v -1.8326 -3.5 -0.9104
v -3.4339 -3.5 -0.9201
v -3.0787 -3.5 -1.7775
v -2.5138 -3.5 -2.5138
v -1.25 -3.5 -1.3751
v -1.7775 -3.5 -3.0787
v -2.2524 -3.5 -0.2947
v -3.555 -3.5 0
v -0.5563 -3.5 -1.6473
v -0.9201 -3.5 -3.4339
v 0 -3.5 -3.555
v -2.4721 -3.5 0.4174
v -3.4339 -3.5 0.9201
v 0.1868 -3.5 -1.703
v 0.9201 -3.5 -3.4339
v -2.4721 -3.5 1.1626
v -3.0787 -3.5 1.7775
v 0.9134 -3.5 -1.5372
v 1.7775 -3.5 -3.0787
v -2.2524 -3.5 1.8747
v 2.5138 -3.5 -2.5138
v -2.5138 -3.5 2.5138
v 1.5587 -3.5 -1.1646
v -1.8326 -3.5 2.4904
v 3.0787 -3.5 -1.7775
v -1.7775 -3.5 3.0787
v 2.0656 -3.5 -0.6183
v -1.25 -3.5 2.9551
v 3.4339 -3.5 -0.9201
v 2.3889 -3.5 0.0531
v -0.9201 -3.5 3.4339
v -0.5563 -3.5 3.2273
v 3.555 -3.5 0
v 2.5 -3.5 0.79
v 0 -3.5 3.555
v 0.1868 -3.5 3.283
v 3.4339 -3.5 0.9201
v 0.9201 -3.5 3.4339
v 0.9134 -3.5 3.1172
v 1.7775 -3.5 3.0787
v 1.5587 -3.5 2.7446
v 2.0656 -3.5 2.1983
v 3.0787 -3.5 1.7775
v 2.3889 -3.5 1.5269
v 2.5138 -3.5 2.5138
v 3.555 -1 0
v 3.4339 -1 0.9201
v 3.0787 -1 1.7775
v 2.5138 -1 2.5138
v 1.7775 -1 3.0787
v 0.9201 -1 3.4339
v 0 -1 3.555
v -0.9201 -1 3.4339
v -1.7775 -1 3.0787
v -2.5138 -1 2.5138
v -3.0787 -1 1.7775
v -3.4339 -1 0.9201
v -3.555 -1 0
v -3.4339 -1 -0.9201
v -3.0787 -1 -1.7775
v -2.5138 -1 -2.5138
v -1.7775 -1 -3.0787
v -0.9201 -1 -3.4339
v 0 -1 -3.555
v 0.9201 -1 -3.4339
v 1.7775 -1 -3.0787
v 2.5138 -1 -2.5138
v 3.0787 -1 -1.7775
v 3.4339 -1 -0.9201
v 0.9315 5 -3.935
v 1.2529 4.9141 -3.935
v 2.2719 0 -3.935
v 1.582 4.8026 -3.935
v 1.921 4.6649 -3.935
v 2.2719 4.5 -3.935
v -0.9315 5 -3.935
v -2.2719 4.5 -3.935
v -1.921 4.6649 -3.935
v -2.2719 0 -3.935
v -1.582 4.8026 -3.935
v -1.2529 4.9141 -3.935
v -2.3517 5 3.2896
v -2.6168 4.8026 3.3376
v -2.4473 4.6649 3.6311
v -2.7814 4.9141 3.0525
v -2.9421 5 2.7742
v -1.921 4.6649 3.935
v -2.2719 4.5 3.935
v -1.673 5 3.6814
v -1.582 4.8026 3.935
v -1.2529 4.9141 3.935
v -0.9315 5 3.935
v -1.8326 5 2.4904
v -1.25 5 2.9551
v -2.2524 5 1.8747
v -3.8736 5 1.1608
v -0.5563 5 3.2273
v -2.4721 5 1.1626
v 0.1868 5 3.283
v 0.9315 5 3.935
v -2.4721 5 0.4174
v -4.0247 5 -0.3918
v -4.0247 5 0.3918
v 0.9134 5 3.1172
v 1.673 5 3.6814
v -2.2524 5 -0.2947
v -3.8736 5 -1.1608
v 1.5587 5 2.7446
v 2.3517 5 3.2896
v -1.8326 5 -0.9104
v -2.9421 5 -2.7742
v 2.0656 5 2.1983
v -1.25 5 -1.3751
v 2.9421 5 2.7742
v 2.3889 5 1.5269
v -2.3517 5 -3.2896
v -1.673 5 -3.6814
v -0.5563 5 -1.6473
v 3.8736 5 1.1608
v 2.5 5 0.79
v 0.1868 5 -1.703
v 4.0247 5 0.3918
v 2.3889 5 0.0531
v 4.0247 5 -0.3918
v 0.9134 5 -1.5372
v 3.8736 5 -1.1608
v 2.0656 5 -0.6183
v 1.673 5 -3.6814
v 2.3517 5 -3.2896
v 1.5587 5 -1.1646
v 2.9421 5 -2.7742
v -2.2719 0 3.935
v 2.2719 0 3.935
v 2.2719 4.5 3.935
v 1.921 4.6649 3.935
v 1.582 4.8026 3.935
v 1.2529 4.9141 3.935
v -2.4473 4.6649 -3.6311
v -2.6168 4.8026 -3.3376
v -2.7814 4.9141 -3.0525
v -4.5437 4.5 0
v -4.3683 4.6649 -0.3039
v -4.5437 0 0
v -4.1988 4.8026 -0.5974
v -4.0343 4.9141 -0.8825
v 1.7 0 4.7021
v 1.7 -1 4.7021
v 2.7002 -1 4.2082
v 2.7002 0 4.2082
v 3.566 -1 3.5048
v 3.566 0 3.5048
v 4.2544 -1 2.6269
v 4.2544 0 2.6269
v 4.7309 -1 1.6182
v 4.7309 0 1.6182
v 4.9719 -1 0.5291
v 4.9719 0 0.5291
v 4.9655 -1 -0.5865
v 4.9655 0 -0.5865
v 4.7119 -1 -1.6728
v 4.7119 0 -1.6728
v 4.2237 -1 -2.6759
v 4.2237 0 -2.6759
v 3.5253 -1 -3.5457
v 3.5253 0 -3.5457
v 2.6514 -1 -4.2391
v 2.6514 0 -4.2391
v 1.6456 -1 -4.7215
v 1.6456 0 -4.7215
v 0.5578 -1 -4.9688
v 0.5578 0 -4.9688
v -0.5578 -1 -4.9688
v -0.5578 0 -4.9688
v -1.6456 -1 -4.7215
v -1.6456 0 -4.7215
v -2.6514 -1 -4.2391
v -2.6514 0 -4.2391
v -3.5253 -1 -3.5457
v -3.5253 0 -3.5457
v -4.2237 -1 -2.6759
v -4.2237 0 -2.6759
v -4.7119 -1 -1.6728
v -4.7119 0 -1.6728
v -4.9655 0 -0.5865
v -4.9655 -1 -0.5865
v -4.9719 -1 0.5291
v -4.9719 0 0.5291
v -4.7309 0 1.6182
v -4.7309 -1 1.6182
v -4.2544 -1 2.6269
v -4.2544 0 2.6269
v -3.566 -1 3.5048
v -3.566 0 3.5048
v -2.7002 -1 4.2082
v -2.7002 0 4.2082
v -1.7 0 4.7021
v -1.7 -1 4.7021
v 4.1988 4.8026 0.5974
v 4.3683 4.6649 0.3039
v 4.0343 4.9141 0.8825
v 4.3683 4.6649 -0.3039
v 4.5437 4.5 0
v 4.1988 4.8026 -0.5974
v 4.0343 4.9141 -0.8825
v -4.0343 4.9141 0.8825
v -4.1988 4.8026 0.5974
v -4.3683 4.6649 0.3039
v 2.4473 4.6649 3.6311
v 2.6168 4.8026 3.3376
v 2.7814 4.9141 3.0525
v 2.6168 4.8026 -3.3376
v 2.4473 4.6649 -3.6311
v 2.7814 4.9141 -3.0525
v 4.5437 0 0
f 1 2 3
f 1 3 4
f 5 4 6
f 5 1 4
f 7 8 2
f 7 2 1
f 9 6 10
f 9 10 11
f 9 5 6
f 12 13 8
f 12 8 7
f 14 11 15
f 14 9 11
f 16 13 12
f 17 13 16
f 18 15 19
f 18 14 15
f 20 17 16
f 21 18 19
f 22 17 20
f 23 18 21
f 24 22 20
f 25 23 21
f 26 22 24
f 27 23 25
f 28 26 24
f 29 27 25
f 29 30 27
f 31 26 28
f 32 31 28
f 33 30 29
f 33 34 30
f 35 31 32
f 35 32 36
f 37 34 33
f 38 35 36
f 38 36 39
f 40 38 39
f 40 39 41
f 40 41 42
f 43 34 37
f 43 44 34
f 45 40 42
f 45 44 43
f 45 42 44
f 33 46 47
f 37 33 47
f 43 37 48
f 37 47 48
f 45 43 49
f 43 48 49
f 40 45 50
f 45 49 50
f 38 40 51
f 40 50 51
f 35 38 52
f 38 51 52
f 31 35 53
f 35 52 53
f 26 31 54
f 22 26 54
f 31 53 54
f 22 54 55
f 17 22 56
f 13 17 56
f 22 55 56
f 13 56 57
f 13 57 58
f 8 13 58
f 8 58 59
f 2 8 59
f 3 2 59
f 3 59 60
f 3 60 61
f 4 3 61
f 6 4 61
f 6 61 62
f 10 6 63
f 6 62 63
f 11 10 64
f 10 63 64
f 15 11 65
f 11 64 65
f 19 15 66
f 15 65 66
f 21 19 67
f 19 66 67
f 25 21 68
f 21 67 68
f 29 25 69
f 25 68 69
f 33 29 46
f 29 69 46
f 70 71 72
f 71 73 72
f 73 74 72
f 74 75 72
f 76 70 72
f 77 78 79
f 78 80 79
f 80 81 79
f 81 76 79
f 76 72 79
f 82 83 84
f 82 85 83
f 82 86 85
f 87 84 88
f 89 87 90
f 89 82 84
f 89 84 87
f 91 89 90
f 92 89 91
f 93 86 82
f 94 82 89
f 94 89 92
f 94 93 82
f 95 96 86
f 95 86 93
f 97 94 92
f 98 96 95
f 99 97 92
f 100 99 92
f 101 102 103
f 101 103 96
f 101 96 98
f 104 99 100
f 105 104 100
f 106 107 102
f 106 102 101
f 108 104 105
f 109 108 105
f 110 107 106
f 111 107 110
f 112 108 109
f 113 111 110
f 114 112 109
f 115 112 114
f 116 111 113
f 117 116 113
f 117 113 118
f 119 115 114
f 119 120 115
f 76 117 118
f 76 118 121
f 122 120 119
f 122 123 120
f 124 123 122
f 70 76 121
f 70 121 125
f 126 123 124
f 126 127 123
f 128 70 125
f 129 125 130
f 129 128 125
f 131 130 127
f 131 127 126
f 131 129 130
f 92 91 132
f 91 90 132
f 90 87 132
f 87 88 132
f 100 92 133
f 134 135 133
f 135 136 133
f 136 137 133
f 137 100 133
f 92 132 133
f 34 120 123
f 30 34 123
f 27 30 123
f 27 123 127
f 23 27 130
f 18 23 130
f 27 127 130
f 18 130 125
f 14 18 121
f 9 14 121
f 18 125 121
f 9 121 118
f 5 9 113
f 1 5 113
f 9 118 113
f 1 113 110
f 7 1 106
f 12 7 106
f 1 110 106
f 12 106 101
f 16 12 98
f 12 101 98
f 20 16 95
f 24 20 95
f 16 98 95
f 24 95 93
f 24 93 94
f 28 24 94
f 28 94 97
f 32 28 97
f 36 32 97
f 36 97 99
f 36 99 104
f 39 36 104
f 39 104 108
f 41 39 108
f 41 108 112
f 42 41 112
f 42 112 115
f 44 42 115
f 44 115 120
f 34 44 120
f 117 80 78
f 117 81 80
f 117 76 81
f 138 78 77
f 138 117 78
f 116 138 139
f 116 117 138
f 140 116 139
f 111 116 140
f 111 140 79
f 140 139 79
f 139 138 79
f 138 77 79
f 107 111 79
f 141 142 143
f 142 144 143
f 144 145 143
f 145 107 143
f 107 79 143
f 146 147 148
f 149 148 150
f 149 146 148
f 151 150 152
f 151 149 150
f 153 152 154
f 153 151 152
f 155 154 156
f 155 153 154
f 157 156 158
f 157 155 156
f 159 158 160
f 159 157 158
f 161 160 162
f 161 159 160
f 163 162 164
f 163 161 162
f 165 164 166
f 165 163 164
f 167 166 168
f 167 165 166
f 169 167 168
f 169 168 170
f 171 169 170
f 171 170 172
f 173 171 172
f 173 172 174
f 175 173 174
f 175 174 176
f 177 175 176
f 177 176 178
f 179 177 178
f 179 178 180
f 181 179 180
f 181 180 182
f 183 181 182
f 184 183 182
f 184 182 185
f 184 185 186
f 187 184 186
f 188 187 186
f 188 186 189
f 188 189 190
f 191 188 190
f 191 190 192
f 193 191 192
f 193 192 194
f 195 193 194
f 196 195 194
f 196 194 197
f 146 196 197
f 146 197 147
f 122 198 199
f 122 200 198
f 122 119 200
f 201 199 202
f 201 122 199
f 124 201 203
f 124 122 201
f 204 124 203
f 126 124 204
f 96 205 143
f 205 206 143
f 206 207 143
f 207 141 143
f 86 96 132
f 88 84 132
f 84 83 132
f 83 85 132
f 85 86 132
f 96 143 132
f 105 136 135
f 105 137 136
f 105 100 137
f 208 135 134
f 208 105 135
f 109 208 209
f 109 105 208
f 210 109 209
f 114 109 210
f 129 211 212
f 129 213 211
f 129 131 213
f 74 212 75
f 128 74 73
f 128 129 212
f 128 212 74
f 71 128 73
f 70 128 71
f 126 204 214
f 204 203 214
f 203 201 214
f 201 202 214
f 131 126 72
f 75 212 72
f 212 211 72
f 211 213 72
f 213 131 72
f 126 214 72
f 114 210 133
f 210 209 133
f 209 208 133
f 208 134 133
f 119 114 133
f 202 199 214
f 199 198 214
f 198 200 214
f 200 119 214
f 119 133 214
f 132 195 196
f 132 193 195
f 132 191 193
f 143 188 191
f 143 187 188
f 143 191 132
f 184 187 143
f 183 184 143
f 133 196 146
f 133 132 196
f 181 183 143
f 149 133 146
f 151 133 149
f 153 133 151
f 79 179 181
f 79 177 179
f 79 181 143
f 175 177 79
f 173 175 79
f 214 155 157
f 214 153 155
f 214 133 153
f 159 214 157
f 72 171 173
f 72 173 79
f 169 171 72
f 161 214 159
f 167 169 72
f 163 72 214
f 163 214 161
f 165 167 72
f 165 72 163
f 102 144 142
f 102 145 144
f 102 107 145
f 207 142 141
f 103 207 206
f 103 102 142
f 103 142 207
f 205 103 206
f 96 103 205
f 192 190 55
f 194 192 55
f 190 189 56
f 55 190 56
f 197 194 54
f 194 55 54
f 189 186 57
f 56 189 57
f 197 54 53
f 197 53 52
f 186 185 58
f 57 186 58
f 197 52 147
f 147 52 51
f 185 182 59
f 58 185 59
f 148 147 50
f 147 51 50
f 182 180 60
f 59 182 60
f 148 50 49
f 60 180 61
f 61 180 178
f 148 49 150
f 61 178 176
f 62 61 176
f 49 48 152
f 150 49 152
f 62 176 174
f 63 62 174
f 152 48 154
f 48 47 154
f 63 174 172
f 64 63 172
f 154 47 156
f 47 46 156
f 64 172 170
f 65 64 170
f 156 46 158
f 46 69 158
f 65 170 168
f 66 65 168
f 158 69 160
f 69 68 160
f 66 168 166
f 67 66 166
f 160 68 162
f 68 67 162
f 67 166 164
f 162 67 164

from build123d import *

# Parameters (mm, degrees)
BOSS_EXTRUDE1_DEPTH = 5
SKETCH2_R           = 5
BOSS_EXTRUDE2_DEPTH = 1
SKETCH3_R           = 3.555
BOSS_EXTRUDE3_DEPTH = 2.5
SKETCH4_R           = 2.5
CUT_EXTRUDE1_DEPTH  = 9.5
CUT_EXTRUDE2_DEPTH  = 4.5


with BuildPart() as part:
    # Sketch1 → Boss-Extrude1 (new body)
    with BuildSketch(Plane(origin=(0, 0, 0), x_dir=(1, 0, 0), z_dir=(0, 1, 0))):
        Polygon((4.543746619, 0), (2.271873309, 3.935), (-2.271873309, 3.935), (-4.543746619, 0), (-2.271873309, -3.935), (2.271873309, -3.935), align=None)
    extrude(amount=BOSS_EXTRUDE1_DEPTH)

    # Sketch2 → Boss-Extrude2 (add)
    with BuildSketch(Plane(origin=(0, 0, 0), x_dir=(1, 0, 0), z_dir=(0, 1, 0))):
        Circle(SKETCH2_R)
    extrude(amount=-BOSS_EXTRUDE2_DEPTH)

    # Sketch3 → Boss-Extrude3 (add)
    with BuildSketch(Plane.XZ.offset(1)):
        Circle(SKETCH3_R)
    extrude(amount=BOSS_EXTRUDE3_DEPTH)

    # Sketch4 → Cut-Extrude1 (cut, through all)
    with BuildSketch(Plane(origin=(0, 5, 0), x_dir=(1, 0, 0), z_dir=(0, 1, 0))):
        with Locations((0, -0.79)):
            Circle(SKETCH4_R)
    extrude(amount=-CUT_EXTRUDE1_DEPTH, mode=Mode.SUBTRACT)

    # Sketch5 → Cut-Extrude2 (cut, through all)
    with BuildSketch(Plane(origin=(0, 0, 0), x_dir=(1, 0, 0), z_dir=(0, 1, 0))):
        with BuildLine():
            Line((-1.7, -4.702127178), (1.7, -4.702127178))
            ThreePointArc((1.7, -4.702127178), (0, -5), (-1.7, -4.702127178))
        make_face()
    extrude(amount=-CUT_EXTRUDE2_DEPTH, mode=Mode.SUBTRACT)

    # Sketch6 → Cut-Revolve1 (revolve, cut)
    with BuildSketch(Plane.XY):
        Polygon((4.043746619, 5), (4.543746619, 5), (4.543746619, 4.5), align=None)
    revolve(axis=Axis((0, 0, 0), (0, 1, 0)), mode=Mode.SUBTRACT)


solid = part.part
